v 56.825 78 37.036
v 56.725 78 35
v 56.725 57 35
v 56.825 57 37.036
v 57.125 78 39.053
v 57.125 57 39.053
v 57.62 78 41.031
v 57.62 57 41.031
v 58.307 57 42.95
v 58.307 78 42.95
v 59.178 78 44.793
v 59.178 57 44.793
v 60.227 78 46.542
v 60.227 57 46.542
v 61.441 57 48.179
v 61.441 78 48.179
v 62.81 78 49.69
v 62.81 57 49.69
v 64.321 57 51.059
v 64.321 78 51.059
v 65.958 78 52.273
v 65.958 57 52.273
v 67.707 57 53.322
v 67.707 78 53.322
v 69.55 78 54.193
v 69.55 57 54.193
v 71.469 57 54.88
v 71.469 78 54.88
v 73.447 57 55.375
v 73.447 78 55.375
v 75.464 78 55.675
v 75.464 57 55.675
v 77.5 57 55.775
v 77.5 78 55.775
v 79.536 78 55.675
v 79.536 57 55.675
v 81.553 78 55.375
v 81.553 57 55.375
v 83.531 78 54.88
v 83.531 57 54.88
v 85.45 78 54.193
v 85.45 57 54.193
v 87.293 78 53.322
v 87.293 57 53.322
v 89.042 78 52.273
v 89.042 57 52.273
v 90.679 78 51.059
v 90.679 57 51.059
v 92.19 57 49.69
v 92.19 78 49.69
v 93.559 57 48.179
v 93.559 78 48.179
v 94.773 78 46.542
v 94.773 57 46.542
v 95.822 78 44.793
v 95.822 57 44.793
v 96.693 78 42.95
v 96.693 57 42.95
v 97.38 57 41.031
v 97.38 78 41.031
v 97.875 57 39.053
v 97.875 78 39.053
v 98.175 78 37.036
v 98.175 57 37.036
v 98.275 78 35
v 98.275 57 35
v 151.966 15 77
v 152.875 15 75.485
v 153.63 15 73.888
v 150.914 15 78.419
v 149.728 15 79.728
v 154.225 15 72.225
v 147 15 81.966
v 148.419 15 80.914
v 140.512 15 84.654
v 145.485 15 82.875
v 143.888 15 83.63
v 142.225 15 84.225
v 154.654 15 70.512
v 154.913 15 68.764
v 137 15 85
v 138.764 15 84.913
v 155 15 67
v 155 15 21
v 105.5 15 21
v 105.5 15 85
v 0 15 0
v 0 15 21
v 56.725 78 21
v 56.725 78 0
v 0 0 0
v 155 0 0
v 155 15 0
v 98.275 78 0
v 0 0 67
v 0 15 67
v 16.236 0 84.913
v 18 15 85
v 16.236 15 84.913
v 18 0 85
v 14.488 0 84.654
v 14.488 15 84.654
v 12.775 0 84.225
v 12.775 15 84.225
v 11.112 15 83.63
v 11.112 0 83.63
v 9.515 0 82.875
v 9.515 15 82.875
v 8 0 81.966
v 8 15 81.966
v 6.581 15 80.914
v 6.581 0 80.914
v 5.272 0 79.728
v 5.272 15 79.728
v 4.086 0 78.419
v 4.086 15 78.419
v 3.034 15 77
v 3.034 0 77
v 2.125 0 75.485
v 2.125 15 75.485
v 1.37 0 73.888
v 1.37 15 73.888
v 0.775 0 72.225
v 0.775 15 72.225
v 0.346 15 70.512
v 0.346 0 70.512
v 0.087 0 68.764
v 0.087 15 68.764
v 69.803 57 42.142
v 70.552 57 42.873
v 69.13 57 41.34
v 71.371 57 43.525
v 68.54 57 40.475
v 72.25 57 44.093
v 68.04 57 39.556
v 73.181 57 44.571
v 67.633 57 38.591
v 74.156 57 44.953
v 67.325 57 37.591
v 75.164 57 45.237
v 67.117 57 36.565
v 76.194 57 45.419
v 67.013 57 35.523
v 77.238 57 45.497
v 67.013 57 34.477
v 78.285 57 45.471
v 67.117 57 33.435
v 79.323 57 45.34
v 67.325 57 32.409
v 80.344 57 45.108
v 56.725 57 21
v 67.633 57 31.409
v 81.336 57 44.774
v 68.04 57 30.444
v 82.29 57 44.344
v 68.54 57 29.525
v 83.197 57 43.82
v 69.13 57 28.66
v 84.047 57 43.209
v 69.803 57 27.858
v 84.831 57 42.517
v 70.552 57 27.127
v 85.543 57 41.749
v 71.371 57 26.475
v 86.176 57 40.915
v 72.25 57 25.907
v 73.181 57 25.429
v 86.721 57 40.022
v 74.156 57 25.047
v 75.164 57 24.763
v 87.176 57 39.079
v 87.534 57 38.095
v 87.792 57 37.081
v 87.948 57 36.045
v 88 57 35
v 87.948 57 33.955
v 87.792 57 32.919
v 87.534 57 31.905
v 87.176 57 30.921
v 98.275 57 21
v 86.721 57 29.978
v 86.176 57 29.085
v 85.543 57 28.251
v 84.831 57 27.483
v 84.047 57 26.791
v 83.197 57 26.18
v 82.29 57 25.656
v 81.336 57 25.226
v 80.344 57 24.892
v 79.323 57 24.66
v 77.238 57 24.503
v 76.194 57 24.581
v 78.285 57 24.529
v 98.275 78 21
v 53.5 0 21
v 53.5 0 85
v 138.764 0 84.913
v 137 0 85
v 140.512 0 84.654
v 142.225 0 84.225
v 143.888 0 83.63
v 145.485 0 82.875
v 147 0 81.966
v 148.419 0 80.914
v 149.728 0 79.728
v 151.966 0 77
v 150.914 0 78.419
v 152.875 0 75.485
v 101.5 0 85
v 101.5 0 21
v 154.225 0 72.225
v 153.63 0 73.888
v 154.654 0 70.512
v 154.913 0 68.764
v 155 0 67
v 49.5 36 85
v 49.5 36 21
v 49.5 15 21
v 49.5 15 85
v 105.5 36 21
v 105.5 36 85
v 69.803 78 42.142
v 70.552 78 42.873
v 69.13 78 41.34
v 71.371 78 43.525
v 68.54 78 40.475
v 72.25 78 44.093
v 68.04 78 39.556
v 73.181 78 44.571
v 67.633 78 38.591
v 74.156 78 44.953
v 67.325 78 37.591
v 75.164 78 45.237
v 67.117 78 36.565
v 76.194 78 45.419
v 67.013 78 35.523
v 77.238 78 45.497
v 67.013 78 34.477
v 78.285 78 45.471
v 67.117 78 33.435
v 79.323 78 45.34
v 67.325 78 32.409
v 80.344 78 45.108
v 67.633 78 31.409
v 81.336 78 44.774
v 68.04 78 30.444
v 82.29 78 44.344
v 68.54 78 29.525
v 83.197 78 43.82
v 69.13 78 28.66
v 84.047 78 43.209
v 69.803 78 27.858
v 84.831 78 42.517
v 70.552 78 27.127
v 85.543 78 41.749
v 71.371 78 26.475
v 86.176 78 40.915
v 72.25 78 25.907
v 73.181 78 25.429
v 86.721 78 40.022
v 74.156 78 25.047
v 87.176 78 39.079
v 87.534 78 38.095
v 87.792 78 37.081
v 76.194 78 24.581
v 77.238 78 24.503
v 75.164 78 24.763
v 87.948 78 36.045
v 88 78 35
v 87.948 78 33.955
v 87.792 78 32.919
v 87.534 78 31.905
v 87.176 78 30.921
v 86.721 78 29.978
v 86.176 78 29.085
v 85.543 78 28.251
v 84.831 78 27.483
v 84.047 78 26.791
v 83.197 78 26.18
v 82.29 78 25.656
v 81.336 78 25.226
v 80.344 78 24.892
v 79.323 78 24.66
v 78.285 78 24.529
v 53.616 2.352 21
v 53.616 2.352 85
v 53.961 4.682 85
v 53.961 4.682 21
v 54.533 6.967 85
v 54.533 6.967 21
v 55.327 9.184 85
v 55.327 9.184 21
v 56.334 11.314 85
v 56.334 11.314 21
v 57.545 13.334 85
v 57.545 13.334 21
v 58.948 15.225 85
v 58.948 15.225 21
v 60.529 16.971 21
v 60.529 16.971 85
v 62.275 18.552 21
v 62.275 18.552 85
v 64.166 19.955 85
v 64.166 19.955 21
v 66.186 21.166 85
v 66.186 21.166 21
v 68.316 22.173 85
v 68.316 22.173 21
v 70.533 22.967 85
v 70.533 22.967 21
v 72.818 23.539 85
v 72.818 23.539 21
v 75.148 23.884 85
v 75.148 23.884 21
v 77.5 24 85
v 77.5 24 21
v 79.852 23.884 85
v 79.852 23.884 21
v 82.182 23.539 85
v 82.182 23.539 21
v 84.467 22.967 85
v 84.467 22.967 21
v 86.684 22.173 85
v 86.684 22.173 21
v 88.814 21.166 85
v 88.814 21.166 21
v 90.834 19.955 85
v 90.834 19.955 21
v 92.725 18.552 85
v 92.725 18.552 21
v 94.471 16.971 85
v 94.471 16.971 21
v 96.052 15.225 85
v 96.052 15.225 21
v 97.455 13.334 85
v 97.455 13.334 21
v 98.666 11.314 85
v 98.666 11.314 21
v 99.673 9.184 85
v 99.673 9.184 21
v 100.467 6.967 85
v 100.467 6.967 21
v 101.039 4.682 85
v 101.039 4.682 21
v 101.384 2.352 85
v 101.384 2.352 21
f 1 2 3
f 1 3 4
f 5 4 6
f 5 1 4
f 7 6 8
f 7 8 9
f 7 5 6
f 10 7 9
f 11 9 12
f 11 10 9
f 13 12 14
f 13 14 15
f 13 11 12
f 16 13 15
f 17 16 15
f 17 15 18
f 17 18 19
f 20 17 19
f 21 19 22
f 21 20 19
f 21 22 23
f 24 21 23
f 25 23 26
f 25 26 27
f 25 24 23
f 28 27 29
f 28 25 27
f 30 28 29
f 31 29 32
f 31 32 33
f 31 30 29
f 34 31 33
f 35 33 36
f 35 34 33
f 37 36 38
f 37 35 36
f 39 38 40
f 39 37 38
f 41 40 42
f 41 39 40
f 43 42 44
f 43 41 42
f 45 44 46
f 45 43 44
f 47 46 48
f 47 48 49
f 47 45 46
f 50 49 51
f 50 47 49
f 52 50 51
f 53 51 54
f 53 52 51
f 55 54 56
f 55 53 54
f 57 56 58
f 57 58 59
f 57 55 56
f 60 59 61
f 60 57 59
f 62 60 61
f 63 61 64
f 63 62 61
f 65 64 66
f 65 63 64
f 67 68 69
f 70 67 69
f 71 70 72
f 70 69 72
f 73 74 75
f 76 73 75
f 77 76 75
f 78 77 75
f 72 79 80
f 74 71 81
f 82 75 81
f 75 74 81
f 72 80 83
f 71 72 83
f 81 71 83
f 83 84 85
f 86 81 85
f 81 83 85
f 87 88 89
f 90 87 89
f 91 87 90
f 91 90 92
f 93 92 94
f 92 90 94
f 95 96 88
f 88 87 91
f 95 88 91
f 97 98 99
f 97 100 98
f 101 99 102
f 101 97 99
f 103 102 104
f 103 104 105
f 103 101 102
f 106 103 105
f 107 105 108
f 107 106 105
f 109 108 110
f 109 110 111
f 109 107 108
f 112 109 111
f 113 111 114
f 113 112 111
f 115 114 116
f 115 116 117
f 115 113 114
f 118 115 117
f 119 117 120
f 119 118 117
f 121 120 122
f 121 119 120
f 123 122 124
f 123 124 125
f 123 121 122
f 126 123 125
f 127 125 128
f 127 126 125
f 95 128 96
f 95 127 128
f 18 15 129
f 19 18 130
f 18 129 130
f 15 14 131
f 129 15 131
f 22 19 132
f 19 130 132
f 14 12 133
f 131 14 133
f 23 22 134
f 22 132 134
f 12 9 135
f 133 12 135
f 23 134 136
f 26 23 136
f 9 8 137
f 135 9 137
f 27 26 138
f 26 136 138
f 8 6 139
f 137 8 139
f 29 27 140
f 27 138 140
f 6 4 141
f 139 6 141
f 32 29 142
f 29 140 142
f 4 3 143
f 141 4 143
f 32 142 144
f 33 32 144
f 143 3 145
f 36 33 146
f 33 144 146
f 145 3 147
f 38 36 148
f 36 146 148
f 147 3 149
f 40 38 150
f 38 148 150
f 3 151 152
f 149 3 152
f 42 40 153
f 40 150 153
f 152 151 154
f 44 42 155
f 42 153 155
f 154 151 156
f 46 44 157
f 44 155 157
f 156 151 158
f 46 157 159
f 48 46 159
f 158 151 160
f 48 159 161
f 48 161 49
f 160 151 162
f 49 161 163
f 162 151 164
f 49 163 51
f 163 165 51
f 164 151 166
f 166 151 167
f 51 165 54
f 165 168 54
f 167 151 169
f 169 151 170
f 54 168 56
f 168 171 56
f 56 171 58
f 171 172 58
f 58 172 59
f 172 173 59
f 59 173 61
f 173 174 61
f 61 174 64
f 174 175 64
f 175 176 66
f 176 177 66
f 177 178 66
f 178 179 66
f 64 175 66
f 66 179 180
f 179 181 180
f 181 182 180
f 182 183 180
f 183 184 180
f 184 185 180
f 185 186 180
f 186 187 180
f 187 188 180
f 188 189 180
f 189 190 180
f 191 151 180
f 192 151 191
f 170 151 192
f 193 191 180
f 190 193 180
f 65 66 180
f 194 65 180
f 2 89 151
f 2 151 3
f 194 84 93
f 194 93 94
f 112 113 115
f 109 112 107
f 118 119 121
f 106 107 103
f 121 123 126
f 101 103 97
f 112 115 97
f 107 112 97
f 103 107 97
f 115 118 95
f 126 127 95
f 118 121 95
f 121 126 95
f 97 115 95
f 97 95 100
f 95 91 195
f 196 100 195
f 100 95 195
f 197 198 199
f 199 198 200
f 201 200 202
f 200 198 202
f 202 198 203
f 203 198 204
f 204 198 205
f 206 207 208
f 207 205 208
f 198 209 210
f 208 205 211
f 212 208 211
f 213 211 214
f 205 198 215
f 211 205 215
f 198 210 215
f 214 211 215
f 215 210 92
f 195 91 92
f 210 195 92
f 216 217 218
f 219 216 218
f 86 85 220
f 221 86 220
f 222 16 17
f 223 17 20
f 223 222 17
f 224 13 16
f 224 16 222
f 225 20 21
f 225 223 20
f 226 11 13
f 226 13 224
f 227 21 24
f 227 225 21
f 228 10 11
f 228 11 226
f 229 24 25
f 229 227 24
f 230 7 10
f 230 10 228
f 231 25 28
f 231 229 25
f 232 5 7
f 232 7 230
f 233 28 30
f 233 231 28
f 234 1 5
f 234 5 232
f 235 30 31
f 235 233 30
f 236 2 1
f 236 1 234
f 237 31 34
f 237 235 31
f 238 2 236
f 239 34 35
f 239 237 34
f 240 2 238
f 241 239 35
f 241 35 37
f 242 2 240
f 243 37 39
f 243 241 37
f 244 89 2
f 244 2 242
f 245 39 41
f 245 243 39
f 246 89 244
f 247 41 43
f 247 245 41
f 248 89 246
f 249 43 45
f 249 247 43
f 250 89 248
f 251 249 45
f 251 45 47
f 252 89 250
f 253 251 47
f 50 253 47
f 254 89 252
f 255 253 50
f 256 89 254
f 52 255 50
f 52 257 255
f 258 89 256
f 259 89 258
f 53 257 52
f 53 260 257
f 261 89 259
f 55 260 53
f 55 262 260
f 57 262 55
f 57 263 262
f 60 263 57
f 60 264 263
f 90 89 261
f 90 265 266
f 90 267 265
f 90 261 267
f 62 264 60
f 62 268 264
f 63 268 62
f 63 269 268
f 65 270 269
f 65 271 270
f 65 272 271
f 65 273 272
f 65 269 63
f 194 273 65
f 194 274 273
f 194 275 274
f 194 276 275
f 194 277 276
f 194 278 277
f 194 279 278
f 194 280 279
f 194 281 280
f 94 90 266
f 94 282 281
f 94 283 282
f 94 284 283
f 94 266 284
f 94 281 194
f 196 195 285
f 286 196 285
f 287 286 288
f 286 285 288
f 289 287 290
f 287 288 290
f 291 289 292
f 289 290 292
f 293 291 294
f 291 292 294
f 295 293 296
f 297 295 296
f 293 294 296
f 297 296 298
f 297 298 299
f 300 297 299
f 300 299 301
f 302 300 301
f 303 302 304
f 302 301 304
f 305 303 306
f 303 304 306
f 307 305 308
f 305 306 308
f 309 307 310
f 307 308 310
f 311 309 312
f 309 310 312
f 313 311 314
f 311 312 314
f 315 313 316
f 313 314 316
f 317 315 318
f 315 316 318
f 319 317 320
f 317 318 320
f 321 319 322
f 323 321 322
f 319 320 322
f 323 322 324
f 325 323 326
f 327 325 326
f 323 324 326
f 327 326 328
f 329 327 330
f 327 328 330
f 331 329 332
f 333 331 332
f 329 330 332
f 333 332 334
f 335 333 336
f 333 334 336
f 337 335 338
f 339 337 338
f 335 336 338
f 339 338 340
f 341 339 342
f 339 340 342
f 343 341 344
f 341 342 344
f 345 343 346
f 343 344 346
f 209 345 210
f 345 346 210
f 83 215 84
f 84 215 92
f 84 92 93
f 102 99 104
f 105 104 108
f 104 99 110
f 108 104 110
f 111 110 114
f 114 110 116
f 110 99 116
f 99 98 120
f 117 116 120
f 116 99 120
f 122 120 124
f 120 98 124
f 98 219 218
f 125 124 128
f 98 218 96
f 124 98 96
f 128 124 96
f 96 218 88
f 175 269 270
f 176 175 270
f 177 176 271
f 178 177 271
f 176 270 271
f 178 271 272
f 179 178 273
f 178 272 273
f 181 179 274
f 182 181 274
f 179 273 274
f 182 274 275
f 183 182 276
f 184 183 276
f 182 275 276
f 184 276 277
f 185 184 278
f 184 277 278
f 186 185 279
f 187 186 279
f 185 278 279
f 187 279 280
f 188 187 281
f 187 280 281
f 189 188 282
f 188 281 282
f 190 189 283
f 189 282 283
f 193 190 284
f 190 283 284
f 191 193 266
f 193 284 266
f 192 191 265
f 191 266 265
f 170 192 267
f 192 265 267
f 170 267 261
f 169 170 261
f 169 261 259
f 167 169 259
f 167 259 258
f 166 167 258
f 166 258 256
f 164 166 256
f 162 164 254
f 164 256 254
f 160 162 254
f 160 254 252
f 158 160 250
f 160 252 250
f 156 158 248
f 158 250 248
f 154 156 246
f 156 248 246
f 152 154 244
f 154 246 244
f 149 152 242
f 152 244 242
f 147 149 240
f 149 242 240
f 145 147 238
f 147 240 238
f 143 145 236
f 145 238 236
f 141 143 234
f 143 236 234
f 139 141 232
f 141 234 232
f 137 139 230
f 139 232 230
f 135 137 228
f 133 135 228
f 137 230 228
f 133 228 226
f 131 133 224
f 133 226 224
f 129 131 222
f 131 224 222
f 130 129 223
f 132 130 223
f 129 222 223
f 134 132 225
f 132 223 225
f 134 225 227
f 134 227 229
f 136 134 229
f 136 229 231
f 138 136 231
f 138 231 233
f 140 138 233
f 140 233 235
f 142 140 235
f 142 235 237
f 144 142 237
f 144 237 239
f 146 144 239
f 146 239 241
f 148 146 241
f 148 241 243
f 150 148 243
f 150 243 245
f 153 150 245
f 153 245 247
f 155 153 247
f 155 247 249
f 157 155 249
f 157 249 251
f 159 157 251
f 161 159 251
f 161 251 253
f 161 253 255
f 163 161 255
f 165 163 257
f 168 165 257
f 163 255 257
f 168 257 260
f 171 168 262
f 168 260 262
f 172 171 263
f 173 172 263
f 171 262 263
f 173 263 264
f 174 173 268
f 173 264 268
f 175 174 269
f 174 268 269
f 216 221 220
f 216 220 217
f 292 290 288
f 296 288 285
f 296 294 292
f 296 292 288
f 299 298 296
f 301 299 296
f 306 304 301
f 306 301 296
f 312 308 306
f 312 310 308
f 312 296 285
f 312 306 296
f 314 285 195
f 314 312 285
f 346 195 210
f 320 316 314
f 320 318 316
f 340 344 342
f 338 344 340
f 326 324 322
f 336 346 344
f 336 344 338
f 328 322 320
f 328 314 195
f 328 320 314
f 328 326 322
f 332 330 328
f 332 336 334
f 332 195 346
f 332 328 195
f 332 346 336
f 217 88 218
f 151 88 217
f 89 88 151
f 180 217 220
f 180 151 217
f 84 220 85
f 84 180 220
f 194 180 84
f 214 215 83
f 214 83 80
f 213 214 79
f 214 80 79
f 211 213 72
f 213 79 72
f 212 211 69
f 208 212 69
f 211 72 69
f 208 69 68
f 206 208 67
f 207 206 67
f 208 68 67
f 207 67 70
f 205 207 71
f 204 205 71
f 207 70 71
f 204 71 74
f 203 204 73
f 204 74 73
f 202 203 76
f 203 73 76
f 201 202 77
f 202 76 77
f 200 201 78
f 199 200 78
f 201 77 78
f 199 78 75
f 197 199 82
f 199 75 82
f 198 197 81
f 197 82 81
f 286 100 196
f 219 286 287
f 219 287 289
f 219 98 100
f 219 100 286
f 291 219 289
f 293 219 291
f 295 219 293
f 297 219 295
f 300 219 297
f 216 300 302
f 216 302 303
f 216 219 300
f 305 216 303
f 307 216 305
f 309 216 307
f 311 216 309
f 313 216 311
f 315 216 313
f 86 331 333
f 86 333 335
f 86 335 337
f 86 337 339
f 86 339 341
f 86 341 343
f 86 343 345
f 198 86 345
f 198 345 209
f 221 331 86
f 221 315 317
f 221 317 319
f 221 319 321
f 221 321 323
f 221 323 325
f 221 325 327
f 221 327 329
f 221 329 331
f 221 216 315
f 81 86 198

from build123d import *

# Parameters (mm, degrees)
SKETCH2_W           = 155
SKETCH2_H           = 78
BOSS_EXTRUDE1_DEPTH = 21
BOSS_EXTRUDE2_DEPTH = 64
FILLET1_R           = 18
CUT_EXTRUDE1_DEPTH  = 22
SKETCH5_R           = 10.5
BOSS_EXTRUDE3_DEPTH = 21


with BuildPart() as part:
    # Sketch2 → Boss-Extrude1 (new body)
    with BuildSketch(Plane.XY):
        with Locations((77.5, 39)):
            Rectangle(SKETCH2_W, SKETCH2_H)
    extrude(amount=BOSS_EXTRUDE1_DEPTH)

    # Sketch3 → Boss-Extrude2 (add)
    with BuildSketch(Plane.XY.offset(21)):
        with BuildLine():
            Line((0, 0), (53.5, 0))
            ThreePointArc((53.5, 0), (77.5, 24), (101.5, 0))
            Line((101.5, 0), (155, 0))
            Line((155, 0), (155, 15))
            Line((155, 15), (105.5, 15))
            Line((105.5, 15), (105.5, 36))
            Line((105.5, 36), (49.5, 36))
            Line((49.5, 36), (49.5, 15))
            Line((49.5, 15), (0, 15))
            Line((0, 15), (0, 0))
        make_face()
    extrude(amount=BOSS_EXTRUDE2_DEPTH)

    # Fillet1
    fillet1_edges = [part.edges().sort_by_distance(p)[0] for p in [
        (0, 7.5, 85),
        (155, 7.5, 85),
    ]]
    fillet(fillet1_edges, radius=FILLET1_R)

    # Sketch4 → Cut-Extrude1 (cut, through all)
    with BuildSketch(Plane.XY.offset(21)):
        Polygon((0, 15), (56.725454791, 78), (0, 78), align=None)
        Polygon((155, 15), (98.274545209, 78), (155, 78), align=None)
    extrude(amount=-CUT_EXTRUDE1_DEPTH, mode=Mode.SUBTRACT)

    # Sketch5 → Boss-Extrude3 (add)
    with BuildSketch(Plane(origin=(0, 78, 0), x_dir=(1, 0, 0), z_dir=(0, 1, 0))):
        with BuildLine():
            Line((56.725454791, 0), (56.725454791, -35))
            ThreePointArc((56.725454791, -35), (77.5, -55.774545209), (98.274545209, -35))
            Line((98.274545209, -35), (98.274545209, 0))
            Line((98.274545209, 0), (56.725454791, 0))
        make_face()
        with Locations((77.5, -35)):
            Circle(SKETCH5_R, mode=Mode.SUBTRACT)
    extrude(amount=-BOSS_EXTRUDE3_DEPTH)


solid = part.part
